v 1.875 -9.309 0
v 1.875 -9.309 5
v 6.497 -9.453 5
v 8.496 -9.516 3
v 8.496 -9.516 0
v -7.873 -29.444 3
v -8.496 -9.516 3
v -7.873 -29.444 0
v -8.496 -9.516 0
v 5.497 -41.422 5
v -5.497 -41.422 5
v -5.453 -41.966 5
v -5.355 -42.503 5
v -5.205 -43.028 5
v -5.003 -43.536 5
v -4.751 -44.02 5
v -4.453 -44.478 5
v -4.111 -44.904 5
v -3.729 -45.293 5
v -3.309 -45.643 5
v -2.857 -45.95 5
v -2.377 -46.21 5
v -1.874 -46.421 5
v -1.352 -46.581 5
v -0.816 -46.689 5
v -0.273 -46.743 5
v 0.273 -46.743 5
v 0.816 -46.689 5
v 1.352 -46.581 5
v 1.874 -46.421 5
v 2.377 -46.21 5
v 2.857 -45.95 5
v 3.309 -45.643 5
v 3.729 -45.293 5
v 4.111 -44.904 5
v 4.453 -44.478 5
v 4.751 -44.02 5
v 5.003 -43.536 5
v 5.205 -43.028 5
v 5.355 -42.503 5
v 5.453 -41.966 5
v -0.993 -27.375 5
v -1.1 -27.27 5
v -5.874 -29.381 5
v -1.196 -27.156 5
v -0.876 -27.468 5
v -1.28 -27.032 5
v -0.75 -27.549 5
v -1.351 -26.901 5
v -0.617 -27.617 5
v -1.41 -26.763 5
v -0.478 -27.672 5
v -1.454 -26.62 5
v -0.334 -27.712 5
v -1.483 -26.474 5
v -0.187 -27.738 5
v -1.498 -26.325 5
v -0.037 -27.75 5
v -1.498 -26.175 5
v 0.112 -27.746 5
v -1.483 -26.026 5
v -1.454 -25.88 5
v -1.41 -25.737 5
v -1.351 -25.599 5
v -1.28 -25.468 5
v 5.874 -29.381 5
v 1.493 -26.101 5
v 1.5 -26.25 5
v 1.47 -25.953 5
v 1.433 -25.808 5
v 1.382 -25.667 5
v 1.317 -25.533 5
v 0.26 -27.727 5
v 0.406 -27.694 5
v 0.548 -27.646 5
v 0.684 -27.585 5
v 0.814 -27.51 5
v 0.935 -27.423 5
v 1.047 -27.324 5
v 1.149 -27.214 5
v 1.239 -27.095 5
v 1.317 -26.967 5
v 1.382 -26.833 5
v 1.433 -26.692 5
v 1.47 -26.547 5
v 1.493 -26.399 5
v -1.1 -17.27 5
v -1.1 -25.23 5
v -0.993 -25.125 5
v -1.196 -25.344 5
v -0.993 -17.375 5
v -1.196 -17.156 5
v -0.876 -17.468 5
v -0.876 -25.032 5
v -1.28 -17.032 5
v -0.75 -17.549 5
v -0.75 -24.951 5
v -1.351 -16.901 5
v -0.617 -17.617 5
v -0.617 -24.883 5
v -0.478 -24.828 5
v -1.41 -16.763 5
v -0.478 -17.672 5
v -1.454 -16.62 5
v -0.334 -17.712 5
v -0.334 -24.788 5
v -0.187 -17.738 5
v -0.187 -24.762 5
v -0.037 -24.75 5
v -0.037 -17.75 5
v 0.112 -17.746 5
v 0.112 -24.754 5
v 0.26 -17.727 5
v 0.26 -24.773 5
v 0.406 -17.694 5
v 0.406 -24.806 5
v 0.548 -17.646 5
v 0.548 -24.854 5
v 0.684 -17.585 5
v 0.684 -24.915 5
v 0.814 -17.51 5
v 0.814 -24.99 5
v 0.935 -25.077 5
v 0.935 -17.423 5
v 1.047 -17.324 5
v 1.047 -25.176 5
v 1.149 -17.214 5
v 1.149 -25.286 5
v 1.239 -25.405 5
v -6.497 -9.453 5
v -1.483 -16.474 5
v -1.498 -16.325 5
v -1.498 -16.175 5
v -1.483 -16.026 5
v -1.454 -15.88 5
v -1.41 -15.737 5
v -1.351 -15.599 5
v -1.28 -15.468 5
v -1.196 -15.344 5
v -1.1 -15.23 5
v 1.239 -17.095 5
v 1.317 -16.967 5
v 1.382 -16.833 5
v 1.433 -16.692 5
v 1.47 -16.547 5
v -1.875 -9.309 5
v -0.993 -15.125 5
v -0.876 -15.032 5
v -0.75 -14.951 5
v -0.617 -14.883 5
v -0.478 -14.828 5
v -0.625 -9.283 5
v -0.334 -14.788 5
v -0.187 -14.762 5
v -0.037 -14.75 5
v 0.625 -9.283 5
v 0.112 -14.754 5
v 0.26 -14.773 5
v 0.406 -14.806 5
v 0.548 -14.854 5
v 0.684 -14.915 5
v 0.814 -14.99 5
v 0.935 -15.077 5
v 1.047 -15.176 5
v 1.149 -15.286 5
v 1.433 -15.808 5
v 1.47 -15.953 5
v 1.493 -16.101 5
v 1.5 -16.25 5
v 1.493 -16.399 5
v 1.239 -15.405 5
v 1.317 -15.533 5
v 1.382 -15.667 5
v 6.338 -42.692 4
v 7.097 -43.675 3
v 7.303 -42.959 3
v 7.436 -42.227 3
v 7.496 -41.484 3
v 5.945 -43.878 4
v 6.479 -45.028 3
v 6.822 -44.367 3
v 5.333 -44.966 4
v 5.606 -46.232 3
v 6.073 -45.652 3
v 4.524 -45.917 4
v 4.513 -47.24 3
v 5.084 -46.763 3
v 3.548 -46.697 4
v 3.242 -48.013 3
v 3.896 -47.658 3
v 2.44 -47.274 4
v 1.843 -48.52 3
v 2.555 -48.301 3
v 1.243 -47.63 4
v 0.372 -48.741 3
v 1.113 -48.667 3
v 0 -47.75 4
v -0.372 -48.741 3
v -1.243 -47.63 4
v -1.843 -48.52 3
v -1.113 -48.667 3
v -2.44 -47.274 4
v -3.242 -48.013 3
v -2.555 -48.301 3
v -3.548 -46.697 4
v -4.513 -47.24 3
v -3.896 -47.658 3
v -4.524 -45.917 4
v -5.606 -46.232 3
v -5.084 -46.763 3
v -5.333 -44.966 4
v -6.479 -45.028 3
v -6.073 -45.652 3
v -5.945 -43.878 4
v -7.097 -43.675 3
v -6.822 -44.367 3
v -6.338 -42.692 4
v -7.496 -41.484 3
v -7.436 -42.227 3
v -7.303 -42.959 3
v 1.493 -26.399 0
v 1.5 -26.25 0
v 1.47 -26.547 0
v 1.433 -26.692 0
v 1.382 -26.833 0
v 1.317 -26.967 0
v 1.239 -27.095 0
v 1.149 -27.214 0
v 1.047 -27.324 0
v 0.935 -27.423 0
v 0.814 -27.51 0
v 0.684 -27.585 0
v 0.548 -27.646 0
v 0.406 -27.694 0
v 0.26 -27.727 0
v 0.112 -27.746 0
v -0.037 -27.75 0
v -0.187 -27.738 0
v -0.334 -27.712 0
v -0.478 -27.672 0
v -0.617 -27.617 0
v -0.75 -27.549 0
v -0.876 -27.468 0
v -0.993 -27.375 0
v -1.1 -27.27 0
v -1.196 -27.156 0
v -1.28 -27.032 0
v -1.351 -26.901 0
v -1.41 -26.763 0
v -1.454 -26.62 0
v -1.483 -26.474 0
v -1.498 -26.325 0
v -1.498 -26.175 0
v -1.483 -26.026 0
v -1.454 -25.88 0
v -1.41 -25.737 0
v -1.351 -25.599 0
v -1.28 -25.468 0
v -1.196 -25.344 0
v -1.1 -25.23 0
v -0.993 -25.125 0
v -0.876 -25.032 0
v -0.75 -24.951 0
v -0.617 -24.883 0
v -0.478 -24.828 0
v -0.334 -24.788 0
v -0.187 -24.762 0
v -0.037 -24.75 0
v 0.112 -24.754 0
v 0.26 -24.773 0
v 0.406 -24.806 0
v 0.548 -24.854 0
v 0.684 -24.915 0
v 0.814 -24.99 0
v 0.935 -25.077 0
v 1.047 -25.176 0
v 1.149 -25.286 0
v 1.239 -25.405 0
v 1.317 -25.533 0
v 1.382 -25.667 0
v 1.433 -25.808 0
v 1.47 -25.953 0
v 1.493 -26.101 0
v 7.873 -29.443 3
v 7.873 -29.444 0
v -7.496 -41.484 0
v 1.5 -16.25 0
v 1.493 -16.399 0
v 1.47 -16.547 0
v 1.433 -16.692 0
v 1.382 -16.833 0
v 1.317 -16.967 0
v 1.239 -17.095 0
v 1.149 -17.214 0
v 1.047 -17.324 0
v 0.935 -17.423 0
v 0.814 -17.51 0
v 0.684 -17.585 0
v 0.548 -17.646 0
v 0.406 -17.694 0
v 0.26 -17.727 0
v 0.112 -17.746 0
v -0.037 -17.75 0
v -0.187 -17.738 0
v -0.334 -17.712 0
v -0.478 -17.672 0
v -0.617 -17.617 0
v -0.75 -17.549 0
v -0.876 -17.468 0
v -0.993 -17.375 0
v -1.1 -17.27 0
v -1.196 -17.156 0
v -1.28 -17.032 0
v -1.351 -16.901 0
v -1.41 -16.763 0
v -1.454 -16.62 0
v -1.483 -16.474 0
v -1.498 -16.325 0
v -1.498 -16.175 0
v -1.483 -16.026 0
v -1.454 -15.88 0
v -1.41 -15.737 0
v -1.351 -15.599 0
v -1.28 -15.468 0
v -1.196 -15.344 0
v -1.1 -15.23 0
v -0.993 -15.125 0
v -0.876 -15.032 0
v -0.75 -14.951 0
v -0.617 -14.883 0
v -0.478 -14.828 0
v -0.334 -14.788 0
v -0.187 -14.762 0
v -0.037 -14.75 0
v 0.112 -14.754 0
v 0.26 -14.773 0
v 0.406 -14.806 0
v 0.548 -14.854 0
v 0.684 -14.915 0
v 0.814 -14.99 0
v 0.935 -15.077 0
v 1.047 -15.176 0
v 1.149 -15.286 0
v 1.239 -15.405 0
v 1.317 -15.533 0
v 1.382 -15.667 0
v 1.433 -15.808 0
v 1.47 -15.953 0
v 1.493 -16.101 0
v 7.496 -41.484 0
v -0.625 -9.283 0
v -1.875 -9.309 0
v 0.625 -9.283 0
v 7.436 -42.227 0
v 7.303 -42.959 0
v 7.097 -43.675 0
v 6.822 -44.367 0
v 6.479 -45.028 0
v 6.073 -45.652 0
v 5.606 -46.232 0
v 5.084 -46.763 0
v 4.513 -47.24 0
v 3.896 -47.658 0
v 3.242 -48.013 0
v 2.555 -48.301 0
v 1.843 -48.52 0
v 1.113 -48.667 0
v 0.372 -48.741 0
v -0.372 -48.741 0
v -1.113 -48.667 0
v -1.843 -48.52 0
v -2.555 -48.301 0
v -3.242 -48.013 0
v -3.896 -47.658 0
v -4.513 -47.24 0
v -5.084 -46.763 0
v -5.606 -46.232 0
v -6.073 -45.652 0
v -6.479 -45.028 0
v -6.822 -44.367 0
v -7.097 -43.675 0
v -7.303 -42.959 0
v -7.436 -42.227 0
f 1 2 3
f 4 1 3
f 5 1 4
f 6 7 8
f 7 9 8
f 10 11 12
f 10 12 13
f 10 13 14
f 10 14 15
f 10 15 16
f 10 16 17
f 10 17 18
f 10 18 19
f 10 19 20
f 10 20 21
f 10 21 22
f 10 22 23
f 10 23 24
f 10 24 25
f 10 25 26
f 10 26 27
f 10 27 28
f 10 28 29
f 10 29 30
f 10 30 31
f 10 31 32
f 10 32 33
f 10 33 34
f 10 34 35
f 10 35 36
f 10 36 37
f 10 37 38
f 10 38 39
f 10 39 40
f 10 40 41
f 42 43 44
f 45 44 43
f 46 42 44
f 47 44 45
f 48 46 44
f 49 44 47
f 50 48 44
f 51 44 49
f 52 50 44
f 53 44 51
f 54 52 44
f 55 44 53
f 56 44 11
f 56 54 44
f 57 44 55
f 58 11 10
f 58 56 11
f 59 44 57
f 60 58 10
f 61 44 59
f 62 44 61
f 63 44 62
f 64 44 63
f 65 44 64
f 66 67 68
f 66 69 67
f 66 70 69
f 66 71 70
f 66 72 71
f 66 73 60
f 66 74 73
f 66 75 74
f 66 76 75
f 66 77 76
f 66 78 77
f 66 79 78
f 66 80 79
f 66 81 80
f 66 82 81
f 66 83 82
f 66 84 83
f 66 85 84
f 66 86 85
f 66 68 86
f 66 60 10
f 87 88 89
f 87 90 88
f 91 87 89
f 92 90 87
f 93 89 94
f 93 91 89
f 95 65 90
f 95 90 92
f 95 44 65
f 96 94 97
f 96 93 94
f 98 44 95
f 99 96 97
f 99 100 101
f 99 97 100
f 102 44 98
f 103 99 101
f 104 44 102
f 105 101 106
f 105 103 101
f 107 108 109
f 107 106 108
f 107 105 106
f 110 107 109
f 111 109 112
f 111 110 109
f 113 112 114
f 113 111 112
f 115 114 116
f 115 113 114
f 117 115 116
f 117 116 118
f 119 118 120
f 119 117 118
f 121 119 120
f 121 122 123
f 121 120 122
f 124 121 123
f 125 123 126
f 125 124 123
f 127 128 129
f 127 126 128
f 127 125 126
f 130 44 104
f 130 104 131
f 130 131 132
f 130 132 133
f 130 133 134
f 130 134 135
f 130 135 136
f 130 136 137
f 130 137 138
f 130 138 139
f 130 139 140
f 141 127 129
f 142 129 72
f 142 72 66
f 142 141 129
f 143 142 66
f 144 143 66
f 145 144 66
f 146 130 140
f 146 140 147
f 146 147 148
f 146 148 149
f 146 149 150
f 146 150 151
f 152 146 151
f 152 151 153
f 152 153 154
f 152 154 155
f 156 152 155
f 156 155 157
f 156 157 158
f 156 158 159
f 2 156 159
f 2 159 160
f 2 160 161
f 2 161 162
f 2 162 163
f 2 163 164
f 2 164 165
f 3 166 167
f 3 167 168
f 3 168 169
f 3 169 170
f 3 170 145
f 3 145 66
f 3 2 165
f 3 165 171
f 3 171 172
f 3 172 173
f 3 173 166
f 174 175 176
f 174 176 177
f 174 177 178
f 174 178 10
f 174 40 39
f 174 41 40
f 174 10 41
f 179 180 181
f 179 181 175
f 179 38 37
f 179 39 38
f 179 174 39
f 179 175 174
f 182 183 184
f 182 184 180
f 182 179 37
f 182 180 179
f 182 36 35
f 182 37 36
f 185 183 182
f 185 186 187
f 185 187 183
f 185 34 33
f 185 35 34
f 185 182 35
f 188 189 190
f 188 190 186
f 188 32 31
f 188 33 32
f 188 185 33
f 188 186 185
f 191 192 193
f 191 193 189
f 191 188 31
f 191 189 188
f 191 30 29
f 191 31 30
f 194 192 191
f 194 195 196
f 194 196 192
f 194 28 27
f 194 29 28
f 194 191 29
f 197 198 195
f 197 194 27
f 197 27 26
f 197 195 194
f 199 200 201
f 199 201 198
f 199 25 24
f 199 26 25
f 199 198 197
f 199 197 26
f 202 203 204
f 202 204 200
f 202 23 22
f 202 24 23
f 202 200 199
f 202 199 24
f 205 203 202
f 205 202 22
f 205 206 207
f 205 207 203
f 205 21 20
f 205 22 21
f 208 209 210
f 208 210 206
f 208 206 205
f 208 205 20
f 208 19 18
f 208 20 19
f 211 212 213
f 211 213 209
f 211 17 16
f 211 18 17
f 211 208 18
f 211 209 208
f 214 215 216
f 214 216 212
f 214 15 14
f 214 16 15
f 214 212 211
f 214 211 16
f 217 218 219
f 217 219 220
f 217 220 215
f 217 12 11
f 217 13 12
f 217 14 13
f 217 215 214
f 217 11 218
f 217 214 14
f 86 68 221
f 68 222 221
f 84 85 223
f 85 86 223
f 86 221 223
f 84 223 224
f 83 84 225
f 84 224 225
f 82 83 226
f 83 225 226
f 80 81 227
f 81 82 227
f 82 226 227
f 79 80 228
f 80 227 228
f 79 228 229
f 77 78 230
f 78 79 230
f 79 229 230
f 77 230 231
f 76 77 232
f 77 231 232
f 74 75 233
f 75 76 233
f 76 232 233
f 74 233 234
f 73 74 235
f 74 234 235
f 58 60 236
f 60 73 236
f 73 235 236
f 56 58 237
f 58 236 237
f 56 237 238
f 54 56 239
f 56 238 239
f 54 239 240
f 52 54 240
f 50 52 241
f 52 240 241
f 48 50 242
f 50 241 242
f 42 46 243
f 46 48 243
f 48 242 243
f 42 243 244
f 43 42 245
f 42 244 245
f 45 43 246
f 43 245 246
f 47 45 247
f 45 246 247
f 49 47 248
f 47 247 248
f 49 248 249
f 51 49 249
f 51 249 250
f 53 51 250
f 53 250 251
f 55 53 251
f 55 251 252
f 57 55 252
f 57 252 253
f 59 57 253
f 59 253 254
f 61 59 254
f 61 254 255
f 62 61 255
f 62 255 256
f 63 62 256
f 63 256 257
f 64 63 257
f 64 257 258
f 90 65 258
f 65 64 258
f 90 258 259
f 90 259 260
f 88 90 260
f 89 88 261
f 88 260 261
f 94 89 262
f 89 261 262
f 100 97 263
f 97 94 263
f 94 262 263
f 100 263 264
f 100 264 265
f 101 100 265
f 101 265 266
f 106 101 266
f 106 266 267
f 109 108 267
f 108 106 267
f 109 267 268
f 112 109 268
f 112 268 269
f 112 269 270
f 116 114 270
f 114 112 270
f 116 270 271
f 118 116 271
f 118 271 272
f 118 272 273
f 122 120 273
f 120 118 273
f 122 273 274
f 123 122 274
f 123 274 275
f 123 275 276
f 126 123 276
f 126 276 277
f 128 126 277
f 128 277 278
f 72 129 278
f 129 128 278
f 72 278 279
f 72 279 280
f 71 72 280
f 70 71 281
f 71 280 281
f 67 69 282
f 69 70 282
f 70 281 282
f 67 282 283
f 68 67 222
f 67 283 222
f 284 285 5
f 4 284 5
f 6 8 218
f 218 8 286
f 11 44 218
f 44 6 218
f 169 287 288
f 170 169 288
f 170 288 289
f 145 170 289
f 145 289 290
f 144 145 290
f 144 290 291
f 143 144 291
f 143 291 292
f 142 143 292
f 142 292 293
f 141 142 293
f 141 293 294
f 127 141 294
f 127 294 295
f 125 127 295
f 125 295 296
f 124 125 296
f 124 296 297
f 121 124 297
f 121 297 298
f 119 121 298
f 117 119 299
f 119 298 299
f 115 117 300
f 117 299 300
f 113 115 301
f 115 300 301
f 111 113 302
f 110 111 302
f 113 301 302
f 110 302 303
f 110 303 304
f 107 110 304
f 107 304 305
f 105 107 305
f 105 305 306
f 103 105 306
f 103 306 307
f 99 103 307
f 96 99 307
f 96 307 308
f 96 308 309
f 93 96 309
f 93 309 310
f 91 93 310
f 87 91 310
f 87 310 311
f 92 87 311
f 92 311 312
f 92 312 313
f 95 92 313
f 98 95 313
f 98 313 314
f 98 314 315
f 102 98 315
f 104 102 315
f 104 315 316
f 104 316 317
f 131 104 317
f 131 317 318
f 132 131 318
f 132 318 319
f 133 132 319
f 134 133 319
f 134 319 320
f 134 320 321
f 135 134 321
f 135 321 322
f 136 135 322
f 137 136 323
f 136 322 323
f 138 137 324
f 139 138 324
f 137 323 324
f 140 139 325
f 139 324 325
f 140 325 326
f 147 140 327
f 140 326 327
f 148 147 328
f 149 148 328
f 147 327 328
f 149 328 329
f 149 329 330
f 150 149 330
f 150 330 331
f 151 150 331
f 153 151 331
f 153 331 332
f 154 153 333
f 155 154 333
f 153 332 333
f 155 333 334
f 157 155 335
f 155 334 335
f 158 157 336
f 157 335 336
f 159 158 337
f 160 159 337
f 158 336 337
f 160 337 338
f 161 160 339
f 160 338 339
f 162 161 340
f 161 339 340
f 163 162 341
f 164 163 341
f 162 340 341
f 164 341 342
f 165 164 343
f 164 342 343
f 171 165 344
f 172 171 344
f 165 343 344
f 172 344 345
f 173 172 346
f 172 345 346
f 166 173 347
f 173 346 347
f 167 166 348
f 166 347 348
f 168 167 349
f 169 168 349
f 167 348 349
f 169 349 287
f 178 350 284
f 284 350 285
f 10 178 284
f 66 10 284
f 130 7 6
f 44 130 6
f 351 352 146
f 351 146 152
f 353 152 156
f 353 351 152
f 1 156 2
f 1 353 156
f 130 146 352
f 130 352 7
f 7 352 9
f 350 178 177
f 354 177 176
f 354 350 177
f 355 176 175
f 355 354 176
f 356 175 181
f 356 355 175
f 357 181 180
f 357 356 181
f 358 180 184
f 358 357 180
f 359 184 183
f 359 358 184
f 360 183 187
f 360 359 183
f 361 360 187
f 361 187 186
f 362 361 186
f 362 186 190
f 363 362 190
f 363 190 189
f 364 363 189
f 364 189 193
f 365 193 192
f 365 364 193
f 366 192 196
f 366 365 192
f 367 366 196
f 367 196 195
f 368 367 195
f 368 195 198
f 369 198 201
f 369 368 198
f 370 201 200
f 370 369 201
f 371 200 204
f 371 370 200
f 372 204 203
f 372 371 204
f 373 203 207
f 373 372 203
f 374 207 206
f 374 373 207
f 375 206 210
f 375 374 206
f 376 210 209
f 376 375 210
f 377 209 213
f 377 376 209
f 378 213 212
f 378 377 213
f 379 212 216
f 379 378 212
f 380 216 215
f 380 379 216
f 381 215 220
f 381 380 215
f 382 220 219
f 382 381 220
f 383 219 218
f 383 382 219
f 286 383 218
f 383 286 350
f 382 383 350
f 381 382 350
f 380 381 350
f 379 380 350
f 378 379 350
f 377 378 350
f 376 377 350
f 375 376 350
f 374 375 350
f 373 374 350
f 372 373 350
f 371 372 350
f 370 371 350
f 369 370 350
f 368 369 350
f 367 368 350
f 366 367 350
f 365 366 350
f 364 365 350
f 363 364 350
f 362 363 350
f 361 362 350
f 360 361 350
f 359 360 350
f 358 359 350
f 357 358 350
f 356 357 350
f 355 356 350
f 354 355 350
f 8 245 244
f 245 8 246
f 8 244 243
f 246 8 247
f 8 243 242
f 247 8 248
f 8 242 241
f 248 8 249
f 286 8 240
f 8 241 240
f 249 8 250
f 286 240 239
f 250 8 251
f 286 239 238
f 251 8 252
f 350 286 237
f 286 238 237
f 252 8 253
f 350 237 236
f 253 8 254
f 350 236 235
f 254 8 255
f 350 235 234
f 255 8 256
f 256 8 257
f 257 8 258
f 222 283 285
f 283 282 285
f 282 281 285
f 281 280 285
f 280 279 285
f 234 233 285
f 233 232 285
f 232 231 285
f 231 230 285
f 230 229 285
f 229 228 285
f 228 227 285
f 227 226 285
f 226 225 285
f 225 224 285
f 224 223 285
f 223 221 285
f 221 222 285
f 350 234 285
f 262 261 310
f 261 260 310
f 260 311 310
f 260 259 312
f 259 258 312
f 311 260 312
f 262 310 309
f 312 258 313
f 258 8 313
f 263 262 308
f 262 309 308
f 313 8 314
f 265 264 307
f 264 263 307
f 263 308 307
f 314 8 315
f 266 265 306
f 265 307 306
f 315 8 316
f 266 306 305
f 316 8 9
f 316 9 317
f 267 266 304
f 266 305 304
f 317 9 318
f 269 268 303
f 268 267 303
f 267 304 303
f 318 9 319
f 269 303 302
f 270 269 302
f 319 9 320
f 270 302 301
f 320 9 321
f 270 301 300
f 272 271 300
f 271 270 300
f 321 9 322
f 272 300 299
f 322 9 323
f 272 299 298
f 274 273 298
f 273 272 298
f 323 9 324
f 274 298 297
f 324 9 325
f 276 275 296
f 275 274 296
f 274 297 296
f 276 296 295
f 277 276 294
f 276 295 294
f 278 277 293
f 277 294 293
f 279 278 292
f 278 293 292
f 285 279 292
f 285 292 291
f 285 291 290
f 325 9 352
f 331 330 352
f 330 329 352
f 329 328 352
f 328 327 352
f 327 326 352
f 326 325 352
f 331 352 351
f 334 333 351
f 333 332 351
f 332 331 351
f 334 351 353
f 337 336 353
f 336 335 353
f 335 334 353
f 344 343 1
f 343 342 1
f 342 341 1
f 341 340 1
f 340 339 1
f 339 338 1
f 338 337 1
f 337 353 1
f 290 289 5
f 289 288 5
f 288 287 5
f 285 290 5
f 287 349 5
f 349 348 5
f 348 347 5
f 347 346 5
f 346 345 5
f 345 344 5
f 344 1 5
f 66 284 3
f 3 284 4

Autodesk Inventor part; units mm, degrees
ref_plane "YZ Plane" through (0, 0, 0) normal (1, 0, 0) x (0, 1, 0)
ref_plane "XZ Plane" through (0, 0, 0) normal (0, 1, 0) x (-1, 0, 0)
ref_plane "XY Plane" through (0, 0, 0) normal (0, 0, 1) x (1, 0, 0)
sketch "Sketch1" plane through (0, 0, 0) normal (0, 0, 1) x (1, 0, 0)
  line L0 (-4.4434, -31.1874) -> (-7.8728, -29.4435) projected
  arc A0 (4.4434, -31.1874) -> (-4.4434, -31.1874) centre (0, -41.25) ccw projected
  line L1 (7.8728, -29.4435) -> (4.4434, -31.1874) projected
  line L2 (7.8728, -29.4435) -> (9.9951, 38.4375) projected
  arc A1 (9.9951, 38.4375) -> (-9.9951, 38.4375) centre (0, 38.75) ccw projected
  line L3 (-9.9951, 38.4375) -> (-7.8728, -29.4435) projected
  circle A2 centre (0, -26.25) radius 1.5 projected
  circle A3 centre (0, -16.25) radius 1.5 projected
  circle A4 centre (0, -41.25) radius 7.5
  line L4 (0, -16.25) -> (0, -9.25)
  line L5 (0, -9.25) -> (8.4958, -9.5156)
  line L6 (0, -9.25) -> (-8.4958, -9.5156)
  line L7 (0, -41.25) -> (7.4963, -41.4844)
  line L8 (0, -41.25) -> (-7.4963, -41.4844)
  line L9 (-8.4958, -9.5156) -> (-7.4963, -41.4844)
  line L10 (7.4963, -41.4844) -> (8.4958, -9.5156)
  arc A5 (-7.4963, -41.4844) -> (7.4963, -41.4844) centre (0, -41.25) ccw
  point P0 (0, 0)
  dimension "d0" = 15
  dimension "d1" = 7
  dimension "d2" = 7.5
extrude "Extrusion1" add sketch "Sketch1" along normal blind 5 contours A0 L1 L10 A4 L9 L0 | L0 L3 L6 L5 L2 L1 A0 | L8 L7 A4 | A4 L7 L8
chamfer "Chamfer1" distance 2 angle 45 3 edges at (-8.1843, -19.4796, 5) (0, -48.75, 5) (8.1843, -19.4796, 5)
fillet "Fillet1" radius 60 1 edges at (0, -9.25, 2.5)
properties part number "leg_bone_2"
